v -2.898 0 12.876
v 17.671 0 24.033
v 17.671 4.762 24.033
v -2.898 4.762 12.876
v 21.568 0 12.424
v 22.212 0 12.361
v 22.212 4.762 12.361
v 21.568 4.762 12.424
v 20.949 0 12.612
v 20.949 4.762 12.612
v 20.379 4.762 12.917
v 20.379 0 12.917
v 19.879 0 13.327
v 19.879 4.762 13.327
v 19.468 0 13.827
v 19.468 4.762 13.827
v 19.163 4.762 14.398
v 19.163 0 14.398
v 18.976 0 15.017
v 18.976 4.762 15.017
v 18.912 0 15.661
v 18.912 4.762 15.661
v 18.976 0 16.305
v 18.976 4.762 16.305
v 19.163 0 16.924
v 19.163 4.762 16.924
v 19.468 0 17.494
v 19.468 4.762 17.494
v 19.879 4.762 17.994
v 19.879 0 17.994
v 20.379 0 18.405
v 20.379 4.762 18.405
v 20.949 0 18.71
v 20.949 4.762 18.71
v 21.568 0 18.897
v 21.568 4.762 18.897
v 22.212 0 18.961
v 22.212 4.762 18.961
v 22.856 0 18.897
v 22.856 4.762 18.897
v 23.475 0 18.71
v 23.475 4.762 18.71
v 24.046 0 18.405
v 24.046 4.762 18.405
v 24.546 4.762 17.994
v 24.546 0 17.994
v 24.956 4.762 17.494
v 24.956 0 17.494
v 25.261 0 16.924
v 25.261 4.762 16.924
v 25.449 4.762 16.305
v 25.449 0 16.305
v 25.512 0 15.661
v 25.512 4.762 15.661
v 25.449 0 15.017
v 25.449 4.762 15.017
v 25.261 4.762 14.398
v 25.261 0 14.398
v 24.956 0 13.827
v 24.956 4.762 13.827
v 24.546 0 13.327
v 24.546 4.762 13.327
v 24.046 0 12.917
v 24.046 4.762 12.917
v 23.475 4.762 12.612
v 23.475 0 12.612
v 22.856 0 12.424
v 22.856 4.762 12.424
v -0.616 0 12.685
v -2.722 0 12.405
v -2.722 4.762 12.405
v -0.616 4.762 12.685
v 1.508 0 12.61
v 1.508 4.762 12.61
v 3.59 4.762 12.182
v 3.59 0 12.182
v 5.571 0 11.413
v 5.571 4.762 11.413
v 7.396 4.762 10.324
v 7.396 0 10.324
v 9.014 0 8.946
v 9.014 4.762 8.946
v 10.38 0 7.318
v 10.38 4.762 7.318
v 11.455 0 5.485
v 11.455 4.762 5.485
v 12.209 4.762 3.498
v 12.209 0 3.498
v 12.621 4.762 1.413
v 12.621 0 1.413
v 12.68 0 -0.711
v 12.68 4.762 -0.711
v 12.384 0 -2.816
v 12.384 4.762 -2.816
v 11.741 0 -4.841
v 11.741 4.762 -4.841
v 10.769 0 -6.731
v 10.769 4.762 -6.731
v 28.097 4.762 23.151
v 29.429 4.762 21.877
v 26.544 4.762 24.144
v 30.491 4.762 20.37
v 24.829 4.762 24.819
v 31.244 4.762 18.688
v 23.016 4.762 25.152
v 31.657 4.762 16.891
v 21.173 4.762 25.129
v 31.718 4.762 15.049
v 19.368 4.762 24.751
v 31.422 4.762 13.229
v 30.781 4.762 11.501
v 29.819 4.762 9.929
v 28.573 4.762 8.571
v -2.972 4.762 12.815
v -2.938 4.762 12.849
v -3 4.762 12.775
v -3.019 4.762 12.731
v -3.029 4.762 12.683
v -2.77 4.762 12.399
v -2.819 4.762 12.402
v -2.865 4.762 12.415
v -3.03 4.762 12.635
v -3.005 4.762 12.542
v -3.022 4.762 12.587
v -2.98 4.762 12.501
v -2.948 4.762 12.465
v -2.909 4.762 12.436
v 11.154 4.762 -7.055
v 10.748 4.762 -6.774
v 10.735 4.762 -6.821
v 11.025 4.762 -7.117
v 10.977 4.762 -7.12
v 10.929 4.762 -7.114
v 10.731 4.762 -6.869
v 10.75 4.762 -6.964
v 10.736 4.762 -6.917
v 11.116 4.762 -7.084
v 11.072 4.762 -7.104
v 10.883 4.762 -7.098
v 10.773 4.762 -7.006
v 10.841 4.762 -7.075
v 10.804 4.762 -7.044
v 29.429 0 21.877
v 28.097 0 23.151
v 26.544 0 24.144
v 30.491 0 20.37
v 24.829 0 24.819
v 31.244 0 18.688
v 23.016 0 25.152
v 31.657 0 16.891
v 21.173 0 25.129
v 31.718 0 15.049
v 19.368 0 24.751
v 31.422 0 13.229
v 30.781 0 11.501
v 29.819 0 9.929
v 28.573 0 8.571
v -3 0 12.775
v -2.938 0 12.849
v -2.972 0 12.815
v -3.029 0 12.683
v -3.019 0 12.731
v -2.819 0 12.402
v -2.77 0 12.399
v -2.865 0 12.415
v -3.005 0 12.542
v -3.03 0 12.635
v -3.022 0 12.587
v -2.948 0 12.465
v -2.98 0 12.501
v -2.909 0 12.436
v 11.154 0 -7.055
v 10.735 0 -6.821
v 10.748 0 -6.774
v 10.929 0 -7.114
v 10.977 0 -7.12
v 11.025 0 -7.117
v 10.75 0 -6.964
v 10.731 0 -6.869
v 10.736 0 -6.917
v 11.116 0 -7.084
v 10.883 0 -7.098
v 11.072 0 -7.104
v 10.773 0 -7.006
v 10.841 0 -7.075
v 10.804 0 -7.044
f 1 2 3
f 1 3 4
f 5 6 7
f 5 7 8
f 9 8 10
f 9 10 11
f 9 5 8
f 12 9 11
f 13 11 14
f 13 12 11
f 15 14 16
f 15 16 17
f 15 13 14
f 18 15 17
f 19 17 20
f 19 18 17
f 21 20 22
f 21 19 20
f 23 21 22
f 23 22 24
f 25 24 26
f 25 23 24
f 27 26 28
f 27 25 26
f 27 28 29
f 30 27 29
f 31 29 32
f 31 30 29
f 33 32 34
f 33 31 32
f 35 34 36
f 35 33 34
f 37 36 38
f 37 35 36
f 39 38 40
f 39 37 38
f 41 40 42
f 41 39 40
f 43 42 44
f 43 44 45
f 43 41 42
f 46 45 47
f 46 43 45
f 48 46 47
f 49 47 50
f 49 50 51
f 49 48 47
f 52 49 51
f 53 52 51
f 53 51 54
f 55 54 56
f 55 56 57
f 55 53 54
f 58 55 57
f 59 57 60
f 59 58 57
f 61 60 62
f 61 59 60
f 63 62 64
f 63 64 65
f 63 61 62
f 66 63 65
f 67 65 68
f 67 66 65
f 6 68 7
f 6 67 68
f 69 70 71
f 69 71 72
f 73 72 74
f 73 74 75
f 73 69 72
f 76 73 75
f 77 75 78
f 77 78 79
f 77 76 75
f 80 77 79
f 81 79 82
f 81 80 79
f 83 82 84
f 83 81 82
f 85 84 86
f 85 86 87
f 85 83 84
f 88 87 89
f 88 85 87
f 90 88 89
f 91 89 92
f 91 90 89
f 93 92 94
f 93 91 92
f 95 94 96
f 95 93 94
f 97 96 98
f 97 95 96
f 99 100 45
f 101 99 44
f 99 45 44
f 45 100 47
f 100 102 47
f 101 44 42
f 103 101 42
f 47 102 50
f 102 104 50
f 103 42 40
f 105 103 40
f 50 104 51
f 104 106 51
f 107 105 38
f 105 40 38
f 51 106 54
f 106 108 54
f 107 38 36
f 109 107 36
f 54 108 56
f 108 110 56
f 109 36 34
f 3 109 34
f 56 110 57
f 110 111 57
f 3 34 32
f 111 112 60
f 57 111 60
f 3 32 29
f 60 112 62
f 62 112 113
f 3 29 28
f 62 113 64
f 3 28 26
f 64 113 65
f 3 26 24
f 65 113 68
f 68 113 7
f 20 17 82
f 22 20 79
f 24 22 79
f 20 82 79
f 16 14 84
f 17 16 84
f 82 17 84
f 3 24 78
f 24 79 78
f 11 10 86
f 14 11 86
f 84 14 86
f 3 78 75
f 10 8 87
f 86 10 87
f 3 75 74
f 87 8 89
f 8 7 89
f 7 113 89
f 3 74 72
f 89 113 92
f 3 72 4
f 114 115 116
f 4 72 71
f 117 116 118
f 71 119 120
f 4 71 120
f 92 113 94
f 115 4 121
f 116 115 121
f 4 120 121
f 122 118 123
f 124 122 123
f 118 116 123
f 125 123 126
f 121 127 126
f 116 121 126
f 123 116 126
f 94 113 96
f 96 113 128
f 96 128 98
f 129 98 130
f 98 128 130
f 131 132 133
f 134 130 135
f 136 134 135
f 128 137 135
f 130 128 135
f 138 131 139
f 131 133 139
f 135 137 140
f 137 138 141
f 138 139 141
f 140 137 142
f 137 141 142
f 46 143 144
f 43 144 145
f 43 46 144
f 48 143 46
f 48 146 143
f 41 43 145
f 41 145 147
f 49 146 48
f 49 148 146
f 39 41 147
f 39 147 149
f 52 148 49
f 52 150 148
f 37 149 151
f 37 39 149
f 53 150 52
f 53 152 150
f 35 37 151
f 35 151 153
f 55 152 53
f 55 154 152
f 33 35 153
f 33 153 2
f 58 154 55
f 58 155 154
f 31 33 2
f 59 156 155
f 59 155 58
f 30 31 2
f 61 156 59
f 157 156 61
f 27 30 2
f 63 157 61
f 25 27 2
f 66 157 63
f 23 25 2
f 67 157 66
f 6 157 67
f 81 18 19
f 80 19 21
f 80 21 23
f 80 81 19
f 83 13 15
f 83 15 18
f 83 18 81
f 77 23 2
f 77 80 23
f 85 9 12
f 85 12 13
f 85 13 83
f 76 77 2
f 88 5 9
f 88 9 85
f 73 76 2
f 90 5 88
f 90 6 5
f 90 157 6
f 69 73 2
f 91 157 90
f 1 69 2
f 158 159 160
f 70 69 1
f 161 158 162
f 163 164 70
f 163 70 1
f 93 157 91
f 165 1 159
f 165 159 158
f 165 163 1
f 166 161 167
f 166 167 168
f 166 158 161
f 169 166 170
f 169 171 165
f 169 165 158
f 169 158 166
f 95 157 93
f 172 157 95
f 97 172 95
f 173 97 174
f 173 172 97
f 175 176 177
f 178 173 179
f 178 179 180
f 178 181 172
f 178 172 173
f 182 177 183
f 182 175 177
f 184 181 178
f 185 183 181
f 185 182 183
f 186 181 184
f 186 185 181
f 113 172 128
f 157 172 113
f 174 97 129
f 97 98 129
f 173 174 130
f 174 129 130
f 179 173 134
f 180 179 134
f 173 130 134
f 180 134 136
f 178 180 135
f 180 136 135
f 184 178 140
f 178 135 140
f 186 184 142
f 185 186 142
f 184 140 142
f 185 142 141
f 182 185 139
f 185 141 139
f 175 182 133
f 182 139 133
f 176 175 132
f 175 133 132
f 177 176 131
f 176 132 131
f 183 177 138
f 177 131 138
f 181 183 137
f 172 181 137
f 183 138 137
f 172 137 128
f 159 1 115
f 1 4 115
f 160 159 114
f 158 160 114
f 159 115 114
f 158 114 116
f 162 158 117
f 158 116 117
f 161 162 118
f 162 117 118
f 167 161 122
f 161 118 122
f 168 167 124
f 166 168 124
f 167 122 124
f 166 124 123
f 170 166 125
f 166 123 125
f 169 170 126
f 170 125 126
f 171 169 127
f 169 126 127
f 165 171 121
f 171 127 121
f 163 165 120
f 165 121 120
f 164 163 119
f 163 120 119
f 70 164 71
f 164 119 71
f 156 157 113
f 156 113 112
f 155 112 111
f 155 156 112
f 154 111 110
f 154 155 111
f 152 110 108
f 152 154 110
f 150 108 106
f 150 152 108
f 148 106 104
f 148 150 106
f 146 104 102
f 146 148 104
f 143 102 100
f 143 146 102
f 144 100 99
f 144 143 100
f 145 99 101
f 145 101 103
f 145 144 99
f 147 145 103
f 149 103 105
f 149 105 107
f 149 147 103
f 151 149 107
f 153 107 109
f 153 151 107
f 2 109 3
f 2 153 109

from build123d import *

# Parameters (mm, degrees)
SKETCH1_R           = 3.3
BOSS_EXTRUDE1_DEPTH = 4.7625
FILLET1_R           = 0.254


with BuildPart() as part:
    # Sketch1 → Boss-Extrude1 (new body)
    with BuildSketch(Plane(origin=(0, 0, 0), x_dir=(1, 0, 0), z_dir=(0, 1, 0))):
        with BuildLine():
            Line((17.670610129, -24.03336424), (-6.055469212, -11.163390731))
            ThreePointArc((-6.055469212, -11.163390731), (10.379538335, -7.318140744), (8.480594992, 9.453544763))
            Line((8.480594992, 9.453544763), (28.572658281, -8.570662619))
            ThreePointArc((28.572658281, -8.570662619), (29.996865789, -21.149426749), (17.670610129, -24.03336424))
        make_face()
        with Locations(Location((22.212212038, -15.660821191, 0), (0, 0, 90))):
            Circle(SKETCH1_R, mode=Mode.SUBTRACT)
    extrude(amount=BOSS_EXTRUDE1_DEPTH)

    # Fillet1
    fillet1_edges = [part.edges().sort_by_distance(p)[0] for p in [
        (-6.055469212, 2.38125, 11.163390731),
        (8.480594992, 2.38125, -9.453544763),
    ]]
    fillet(fillet1_edges, radius=FILLET1_R)


solid = part.part
